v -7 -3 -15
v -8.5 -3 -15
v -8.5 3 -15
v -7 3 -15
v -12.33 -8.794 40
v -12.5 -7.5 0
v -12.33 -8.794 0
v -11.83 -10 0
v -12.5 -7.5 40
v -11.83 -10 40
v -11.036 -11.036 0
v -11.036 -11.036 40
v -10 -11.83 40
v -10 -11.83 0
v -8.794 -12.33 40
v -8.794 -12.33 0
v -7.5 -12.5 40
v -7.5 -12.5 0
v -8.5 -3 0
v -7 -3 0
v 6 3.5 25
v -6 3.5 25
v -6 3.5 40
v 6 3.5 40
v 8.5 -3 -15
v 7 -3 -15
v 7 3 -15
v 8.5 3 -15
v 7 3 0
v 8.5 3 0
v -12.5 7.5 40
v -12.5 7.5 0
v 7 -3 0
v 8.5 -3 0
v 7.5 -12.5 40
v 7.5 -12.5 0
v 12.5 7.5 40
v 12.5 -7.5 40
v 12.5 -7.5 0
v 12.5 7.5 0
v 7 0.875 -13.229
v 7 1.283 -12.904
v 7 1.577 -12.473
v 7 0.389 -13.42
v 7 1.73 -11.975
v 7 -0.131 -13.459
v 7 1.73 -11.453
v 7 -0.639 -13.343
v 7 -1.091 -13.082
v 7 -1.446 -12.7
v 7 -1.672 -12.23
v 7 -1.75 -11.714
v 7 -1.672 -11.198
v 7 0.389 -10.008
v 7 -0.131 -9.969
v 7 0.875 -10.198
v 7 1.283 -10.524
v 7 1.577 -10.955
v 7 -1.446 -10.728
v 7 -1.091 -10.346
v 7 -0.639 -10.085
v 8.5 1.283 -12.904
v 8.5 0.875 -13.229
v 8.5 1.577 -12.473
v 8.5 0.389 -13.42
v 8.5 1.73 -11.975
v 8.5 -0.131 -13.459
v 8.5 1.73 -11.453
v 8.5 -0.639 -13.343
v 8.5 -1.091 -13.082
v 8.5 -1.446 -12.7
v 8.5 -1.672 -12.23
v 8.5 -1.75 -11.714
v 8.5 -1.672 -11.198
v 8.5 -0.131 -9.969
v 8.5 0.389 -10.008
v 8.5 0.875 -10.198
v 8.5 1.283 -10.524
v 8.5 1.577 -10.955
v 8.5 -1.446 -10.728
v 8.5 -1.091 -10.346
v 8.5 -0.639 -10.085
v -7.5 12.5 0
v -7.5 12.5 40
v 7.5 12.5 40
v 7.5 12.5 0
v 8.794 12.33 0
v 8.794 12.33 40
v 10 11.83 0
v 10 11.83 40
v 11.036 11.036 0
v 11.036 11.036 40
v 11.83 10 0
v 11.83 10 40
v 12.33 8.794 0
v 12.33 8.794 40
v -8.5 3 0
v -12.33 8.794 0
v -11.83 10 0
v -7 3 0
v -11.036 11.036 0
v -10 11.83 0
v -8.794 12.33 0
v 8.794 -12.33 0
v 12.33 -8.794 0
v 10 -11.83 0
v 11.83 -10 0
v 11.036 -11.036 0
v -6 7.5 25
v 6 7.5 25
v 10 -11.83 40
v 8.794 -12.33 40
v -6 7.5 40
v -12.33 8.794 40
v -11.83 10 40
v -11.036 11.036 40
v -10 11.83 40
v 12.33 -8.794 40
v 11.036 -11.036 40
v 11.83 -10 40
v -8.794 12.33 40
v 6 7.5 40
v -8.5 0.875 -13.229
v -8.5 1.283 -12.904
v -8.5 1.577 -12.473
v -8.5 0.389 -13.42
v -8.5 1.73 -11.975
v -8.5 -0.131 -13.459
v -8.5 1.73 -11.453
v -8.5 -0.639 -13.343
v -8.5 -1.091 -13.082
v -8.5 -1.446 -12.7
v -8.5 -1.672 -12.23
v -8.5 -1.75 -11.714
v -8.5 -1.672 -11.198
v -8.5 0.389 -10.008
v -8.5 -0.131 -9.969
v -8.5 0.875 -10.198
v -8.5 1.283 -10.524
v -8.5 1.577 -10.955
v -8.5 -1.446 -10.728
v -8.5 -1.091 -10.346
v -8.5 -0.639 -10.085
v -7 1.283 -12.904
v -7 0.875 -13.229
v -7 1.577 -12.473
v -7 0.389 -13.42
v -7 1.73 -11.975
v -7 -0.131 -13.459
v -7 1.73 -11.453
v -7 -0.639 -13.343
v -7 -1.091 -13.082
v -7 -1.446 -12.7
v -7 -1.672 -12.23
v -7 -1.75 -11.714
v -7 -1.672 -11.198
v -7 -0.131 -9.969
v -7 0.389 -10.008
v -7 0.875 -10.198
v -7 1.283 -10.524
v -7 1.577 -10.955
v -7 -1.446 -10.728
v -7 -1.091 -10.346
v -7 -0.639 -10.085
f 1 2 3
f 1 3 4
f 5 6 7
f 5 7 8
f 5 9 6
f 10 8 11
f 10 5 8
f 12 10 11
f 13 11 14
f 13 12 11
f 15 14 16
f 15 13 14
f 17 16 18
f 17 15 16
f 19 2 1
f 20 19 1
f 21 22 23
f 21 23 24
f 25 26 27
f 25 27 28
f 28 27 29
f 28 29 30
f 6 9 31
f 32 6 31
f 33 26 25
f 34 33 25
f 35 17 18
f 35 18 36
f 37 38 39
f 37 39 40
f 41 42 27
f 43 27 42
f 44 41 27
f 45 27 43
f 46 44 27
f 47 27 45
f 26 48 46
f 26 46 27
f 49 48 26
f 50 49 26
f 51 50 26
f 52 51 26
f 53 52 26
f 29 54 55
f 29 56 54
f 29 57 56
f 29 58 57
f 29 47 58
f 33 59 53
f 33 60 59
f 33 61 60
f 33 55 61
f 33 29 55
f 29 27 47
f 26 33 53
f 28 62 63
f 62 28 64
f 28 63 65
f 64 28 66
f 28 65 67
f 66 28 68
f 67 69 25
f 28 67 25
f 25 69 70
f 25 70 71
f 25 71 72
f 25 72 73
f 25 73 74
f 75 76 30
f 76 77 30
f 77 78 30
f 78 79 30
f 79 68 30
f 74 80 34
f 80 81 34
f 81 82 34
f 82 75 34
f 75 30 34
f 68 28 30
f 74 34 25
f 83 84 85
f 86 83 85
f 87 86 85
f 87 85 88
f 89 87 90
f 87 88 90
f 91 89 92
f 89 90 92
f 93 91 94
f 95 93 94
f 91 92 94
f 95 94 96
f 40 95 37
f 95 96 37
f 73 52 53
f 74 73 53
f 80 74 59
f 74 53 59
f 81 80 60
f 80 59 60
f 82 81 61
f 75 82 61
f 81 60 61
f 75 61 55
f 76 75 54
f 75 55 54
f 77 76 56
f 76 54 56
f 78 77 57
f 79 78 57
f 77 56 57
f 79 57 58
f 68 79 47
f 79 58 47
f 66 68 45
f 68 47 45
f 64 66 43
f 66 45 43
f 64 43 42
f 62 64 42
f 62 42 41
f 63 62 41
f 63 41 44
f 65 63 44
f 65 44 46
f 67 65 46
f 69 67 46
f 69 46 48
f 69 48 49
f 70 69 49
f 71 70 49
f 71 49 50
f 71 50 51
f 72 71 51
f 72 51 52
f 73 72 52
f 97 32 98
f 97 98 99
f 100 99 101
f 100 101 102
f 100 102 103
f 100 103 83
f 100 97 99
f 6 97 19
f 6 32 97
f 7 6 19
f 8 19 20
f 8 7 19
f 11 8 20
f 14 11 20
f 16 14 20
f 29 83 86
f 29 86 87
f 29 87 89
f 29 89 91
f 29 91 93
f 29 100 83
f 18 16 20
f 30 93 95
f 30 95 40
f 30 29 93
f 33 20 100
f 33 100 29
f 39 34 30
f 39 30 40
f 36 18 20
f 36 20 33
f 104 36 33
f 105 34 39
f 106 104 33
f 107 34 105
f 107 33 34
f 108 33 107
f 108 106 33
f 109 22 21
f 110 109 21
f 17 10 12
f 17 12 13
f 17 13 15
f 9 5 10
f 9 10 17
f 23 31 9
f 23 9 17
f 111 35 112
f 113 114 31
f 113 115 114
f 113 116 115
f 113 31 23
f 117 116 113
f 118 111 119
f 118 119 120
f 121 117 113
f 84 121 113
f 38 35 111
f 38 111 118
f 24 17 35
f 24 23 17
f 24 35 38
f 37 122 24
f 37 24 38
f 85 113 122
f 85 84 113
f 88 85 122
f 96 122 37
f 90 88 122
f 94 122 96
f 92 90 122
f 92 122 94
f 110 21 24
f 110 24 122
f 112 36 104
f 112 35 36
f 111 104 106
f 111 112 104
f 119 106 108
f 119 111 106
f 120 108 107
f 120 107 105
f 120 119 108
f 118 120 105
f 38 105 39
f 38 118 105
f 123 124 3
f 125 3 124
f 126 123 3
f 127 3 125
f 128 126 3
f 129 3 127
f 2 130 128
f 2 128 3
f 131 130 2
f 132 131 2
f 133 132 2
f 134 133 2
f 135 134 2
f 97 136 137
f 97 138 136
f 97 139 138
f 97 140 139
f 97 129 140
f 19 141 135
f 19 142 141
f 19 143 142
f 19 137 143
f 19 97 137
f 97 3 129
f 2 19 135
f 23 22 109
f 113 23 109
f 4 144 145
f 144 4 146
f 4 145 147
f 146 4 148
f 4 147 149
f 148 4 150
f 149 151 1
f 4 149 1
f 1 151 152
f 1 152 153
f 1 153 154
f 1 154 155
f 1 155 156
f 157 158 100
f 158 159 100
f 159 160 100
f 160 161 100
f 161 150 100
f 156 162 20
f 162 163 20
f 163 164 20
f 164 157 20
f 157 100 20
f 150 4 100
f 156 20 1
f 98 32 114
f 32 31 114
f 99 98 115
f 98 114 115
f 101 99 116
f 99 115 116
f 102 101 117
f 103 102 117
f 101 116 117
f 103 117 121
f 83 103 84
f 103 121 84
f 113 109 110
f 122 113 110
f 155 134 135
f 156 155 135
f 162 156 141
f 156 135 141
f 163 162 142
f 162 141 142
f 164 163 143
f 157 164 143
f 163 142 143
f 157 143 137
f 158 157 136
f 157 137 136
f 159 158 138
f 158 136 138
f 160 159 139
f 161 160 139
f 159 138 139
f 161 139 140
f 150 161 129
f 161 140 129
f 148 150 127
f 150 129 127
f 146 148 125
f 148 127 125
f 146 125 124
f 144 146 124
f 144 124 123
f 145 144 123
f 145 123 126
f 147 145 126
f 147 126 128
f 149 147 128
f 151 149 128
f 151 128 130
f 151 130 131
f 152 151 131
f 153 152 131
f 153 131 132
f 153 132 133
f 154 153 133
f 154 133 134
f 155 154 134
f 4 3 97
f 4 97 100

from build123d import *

# Parameters (mm, degrees)
F0_W     = 25
F0_H     = 25
F0_W_2   = 12
F0_H_2   = 4
F1_DEPTH = 40
F2_W     = 1.5
F2_H     = 6
F3_DEPTH = 15
F4_R     = 1.75
F5_DEPTH = 25
F6_W     = 12
F6_H     = 4
F7_DEPTH = 25
F8_R     = 5


with BuildPart() as f1:
    # F0 (on Top) → F1 (new body)
    with BuildSketch(Plane.XY):
        Rectangle(F0_W, F0_H)
        with Locations((0, 5.5)):
            Rectangle(F0_W_2, F0_H_2, mode=Mode.SUBTRACT)
    extrude(amount=F1_DEPTH)

    # F2 (on face) → F3 (join)
    with BuildSketch(Plane(origin=(0, 0, 0), x_dir=(1, 0, 0), z_dir=(0, 0, -1))):
        with Locations((-7.75, 0)):
            Rectangle(F2_W, F2_H)
        with Locations((7.75, 0)):
            Rectangle(F2_W, F2_H)
    extrude(amount=F3_DEPTH)

    # F4 (on face) → F5 (cut)
    with BuildSketch(Plane(origin=(-8.5, 0, 0), x_dir=(0, -1, 0), z_dir=(-1, 0, 0))):
        with Locations((0, -11.713912)):
            Circle(F4_R)
    extrude(amount=-F5_DEPTH, mode=Mode.SUBTRACT)

    # F6 (on face) → F7 (join)
    with BuildSketch(Plane(origin=(0, 0, 0), x_dir=(1, 0, 0), z_dir=(0, 0, -1))):
        with Locations((0, -5.5)):
            Rectangle(F6_W, F6_H)
    extrude(amount=-F7_DEPTH)

    # F8
    f8_edges = [f1.edges().sort_by_distance(p)[0] for p in [
        (12.5, 12.5, 20),
        (-12.5, 12.5, 20),
        (12.5, -12.5, 20),
        (-12.5, -12.5, 20),
    ]]
    fillet(f8_edges, radius=F8_R)


solid = f1.part
